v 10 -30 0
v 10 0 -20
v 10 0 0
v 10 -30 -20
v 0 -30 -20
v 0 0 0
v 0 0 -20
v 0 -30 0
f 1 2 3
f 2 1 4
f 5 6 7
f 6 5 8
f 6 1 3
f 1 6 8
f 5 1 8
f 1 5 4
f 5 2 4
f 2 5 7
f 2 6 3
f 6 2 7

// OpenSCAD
rotate([-90, 0, -90]) cube([30, 20, 10]);
%cube([30, 20, 10]);
